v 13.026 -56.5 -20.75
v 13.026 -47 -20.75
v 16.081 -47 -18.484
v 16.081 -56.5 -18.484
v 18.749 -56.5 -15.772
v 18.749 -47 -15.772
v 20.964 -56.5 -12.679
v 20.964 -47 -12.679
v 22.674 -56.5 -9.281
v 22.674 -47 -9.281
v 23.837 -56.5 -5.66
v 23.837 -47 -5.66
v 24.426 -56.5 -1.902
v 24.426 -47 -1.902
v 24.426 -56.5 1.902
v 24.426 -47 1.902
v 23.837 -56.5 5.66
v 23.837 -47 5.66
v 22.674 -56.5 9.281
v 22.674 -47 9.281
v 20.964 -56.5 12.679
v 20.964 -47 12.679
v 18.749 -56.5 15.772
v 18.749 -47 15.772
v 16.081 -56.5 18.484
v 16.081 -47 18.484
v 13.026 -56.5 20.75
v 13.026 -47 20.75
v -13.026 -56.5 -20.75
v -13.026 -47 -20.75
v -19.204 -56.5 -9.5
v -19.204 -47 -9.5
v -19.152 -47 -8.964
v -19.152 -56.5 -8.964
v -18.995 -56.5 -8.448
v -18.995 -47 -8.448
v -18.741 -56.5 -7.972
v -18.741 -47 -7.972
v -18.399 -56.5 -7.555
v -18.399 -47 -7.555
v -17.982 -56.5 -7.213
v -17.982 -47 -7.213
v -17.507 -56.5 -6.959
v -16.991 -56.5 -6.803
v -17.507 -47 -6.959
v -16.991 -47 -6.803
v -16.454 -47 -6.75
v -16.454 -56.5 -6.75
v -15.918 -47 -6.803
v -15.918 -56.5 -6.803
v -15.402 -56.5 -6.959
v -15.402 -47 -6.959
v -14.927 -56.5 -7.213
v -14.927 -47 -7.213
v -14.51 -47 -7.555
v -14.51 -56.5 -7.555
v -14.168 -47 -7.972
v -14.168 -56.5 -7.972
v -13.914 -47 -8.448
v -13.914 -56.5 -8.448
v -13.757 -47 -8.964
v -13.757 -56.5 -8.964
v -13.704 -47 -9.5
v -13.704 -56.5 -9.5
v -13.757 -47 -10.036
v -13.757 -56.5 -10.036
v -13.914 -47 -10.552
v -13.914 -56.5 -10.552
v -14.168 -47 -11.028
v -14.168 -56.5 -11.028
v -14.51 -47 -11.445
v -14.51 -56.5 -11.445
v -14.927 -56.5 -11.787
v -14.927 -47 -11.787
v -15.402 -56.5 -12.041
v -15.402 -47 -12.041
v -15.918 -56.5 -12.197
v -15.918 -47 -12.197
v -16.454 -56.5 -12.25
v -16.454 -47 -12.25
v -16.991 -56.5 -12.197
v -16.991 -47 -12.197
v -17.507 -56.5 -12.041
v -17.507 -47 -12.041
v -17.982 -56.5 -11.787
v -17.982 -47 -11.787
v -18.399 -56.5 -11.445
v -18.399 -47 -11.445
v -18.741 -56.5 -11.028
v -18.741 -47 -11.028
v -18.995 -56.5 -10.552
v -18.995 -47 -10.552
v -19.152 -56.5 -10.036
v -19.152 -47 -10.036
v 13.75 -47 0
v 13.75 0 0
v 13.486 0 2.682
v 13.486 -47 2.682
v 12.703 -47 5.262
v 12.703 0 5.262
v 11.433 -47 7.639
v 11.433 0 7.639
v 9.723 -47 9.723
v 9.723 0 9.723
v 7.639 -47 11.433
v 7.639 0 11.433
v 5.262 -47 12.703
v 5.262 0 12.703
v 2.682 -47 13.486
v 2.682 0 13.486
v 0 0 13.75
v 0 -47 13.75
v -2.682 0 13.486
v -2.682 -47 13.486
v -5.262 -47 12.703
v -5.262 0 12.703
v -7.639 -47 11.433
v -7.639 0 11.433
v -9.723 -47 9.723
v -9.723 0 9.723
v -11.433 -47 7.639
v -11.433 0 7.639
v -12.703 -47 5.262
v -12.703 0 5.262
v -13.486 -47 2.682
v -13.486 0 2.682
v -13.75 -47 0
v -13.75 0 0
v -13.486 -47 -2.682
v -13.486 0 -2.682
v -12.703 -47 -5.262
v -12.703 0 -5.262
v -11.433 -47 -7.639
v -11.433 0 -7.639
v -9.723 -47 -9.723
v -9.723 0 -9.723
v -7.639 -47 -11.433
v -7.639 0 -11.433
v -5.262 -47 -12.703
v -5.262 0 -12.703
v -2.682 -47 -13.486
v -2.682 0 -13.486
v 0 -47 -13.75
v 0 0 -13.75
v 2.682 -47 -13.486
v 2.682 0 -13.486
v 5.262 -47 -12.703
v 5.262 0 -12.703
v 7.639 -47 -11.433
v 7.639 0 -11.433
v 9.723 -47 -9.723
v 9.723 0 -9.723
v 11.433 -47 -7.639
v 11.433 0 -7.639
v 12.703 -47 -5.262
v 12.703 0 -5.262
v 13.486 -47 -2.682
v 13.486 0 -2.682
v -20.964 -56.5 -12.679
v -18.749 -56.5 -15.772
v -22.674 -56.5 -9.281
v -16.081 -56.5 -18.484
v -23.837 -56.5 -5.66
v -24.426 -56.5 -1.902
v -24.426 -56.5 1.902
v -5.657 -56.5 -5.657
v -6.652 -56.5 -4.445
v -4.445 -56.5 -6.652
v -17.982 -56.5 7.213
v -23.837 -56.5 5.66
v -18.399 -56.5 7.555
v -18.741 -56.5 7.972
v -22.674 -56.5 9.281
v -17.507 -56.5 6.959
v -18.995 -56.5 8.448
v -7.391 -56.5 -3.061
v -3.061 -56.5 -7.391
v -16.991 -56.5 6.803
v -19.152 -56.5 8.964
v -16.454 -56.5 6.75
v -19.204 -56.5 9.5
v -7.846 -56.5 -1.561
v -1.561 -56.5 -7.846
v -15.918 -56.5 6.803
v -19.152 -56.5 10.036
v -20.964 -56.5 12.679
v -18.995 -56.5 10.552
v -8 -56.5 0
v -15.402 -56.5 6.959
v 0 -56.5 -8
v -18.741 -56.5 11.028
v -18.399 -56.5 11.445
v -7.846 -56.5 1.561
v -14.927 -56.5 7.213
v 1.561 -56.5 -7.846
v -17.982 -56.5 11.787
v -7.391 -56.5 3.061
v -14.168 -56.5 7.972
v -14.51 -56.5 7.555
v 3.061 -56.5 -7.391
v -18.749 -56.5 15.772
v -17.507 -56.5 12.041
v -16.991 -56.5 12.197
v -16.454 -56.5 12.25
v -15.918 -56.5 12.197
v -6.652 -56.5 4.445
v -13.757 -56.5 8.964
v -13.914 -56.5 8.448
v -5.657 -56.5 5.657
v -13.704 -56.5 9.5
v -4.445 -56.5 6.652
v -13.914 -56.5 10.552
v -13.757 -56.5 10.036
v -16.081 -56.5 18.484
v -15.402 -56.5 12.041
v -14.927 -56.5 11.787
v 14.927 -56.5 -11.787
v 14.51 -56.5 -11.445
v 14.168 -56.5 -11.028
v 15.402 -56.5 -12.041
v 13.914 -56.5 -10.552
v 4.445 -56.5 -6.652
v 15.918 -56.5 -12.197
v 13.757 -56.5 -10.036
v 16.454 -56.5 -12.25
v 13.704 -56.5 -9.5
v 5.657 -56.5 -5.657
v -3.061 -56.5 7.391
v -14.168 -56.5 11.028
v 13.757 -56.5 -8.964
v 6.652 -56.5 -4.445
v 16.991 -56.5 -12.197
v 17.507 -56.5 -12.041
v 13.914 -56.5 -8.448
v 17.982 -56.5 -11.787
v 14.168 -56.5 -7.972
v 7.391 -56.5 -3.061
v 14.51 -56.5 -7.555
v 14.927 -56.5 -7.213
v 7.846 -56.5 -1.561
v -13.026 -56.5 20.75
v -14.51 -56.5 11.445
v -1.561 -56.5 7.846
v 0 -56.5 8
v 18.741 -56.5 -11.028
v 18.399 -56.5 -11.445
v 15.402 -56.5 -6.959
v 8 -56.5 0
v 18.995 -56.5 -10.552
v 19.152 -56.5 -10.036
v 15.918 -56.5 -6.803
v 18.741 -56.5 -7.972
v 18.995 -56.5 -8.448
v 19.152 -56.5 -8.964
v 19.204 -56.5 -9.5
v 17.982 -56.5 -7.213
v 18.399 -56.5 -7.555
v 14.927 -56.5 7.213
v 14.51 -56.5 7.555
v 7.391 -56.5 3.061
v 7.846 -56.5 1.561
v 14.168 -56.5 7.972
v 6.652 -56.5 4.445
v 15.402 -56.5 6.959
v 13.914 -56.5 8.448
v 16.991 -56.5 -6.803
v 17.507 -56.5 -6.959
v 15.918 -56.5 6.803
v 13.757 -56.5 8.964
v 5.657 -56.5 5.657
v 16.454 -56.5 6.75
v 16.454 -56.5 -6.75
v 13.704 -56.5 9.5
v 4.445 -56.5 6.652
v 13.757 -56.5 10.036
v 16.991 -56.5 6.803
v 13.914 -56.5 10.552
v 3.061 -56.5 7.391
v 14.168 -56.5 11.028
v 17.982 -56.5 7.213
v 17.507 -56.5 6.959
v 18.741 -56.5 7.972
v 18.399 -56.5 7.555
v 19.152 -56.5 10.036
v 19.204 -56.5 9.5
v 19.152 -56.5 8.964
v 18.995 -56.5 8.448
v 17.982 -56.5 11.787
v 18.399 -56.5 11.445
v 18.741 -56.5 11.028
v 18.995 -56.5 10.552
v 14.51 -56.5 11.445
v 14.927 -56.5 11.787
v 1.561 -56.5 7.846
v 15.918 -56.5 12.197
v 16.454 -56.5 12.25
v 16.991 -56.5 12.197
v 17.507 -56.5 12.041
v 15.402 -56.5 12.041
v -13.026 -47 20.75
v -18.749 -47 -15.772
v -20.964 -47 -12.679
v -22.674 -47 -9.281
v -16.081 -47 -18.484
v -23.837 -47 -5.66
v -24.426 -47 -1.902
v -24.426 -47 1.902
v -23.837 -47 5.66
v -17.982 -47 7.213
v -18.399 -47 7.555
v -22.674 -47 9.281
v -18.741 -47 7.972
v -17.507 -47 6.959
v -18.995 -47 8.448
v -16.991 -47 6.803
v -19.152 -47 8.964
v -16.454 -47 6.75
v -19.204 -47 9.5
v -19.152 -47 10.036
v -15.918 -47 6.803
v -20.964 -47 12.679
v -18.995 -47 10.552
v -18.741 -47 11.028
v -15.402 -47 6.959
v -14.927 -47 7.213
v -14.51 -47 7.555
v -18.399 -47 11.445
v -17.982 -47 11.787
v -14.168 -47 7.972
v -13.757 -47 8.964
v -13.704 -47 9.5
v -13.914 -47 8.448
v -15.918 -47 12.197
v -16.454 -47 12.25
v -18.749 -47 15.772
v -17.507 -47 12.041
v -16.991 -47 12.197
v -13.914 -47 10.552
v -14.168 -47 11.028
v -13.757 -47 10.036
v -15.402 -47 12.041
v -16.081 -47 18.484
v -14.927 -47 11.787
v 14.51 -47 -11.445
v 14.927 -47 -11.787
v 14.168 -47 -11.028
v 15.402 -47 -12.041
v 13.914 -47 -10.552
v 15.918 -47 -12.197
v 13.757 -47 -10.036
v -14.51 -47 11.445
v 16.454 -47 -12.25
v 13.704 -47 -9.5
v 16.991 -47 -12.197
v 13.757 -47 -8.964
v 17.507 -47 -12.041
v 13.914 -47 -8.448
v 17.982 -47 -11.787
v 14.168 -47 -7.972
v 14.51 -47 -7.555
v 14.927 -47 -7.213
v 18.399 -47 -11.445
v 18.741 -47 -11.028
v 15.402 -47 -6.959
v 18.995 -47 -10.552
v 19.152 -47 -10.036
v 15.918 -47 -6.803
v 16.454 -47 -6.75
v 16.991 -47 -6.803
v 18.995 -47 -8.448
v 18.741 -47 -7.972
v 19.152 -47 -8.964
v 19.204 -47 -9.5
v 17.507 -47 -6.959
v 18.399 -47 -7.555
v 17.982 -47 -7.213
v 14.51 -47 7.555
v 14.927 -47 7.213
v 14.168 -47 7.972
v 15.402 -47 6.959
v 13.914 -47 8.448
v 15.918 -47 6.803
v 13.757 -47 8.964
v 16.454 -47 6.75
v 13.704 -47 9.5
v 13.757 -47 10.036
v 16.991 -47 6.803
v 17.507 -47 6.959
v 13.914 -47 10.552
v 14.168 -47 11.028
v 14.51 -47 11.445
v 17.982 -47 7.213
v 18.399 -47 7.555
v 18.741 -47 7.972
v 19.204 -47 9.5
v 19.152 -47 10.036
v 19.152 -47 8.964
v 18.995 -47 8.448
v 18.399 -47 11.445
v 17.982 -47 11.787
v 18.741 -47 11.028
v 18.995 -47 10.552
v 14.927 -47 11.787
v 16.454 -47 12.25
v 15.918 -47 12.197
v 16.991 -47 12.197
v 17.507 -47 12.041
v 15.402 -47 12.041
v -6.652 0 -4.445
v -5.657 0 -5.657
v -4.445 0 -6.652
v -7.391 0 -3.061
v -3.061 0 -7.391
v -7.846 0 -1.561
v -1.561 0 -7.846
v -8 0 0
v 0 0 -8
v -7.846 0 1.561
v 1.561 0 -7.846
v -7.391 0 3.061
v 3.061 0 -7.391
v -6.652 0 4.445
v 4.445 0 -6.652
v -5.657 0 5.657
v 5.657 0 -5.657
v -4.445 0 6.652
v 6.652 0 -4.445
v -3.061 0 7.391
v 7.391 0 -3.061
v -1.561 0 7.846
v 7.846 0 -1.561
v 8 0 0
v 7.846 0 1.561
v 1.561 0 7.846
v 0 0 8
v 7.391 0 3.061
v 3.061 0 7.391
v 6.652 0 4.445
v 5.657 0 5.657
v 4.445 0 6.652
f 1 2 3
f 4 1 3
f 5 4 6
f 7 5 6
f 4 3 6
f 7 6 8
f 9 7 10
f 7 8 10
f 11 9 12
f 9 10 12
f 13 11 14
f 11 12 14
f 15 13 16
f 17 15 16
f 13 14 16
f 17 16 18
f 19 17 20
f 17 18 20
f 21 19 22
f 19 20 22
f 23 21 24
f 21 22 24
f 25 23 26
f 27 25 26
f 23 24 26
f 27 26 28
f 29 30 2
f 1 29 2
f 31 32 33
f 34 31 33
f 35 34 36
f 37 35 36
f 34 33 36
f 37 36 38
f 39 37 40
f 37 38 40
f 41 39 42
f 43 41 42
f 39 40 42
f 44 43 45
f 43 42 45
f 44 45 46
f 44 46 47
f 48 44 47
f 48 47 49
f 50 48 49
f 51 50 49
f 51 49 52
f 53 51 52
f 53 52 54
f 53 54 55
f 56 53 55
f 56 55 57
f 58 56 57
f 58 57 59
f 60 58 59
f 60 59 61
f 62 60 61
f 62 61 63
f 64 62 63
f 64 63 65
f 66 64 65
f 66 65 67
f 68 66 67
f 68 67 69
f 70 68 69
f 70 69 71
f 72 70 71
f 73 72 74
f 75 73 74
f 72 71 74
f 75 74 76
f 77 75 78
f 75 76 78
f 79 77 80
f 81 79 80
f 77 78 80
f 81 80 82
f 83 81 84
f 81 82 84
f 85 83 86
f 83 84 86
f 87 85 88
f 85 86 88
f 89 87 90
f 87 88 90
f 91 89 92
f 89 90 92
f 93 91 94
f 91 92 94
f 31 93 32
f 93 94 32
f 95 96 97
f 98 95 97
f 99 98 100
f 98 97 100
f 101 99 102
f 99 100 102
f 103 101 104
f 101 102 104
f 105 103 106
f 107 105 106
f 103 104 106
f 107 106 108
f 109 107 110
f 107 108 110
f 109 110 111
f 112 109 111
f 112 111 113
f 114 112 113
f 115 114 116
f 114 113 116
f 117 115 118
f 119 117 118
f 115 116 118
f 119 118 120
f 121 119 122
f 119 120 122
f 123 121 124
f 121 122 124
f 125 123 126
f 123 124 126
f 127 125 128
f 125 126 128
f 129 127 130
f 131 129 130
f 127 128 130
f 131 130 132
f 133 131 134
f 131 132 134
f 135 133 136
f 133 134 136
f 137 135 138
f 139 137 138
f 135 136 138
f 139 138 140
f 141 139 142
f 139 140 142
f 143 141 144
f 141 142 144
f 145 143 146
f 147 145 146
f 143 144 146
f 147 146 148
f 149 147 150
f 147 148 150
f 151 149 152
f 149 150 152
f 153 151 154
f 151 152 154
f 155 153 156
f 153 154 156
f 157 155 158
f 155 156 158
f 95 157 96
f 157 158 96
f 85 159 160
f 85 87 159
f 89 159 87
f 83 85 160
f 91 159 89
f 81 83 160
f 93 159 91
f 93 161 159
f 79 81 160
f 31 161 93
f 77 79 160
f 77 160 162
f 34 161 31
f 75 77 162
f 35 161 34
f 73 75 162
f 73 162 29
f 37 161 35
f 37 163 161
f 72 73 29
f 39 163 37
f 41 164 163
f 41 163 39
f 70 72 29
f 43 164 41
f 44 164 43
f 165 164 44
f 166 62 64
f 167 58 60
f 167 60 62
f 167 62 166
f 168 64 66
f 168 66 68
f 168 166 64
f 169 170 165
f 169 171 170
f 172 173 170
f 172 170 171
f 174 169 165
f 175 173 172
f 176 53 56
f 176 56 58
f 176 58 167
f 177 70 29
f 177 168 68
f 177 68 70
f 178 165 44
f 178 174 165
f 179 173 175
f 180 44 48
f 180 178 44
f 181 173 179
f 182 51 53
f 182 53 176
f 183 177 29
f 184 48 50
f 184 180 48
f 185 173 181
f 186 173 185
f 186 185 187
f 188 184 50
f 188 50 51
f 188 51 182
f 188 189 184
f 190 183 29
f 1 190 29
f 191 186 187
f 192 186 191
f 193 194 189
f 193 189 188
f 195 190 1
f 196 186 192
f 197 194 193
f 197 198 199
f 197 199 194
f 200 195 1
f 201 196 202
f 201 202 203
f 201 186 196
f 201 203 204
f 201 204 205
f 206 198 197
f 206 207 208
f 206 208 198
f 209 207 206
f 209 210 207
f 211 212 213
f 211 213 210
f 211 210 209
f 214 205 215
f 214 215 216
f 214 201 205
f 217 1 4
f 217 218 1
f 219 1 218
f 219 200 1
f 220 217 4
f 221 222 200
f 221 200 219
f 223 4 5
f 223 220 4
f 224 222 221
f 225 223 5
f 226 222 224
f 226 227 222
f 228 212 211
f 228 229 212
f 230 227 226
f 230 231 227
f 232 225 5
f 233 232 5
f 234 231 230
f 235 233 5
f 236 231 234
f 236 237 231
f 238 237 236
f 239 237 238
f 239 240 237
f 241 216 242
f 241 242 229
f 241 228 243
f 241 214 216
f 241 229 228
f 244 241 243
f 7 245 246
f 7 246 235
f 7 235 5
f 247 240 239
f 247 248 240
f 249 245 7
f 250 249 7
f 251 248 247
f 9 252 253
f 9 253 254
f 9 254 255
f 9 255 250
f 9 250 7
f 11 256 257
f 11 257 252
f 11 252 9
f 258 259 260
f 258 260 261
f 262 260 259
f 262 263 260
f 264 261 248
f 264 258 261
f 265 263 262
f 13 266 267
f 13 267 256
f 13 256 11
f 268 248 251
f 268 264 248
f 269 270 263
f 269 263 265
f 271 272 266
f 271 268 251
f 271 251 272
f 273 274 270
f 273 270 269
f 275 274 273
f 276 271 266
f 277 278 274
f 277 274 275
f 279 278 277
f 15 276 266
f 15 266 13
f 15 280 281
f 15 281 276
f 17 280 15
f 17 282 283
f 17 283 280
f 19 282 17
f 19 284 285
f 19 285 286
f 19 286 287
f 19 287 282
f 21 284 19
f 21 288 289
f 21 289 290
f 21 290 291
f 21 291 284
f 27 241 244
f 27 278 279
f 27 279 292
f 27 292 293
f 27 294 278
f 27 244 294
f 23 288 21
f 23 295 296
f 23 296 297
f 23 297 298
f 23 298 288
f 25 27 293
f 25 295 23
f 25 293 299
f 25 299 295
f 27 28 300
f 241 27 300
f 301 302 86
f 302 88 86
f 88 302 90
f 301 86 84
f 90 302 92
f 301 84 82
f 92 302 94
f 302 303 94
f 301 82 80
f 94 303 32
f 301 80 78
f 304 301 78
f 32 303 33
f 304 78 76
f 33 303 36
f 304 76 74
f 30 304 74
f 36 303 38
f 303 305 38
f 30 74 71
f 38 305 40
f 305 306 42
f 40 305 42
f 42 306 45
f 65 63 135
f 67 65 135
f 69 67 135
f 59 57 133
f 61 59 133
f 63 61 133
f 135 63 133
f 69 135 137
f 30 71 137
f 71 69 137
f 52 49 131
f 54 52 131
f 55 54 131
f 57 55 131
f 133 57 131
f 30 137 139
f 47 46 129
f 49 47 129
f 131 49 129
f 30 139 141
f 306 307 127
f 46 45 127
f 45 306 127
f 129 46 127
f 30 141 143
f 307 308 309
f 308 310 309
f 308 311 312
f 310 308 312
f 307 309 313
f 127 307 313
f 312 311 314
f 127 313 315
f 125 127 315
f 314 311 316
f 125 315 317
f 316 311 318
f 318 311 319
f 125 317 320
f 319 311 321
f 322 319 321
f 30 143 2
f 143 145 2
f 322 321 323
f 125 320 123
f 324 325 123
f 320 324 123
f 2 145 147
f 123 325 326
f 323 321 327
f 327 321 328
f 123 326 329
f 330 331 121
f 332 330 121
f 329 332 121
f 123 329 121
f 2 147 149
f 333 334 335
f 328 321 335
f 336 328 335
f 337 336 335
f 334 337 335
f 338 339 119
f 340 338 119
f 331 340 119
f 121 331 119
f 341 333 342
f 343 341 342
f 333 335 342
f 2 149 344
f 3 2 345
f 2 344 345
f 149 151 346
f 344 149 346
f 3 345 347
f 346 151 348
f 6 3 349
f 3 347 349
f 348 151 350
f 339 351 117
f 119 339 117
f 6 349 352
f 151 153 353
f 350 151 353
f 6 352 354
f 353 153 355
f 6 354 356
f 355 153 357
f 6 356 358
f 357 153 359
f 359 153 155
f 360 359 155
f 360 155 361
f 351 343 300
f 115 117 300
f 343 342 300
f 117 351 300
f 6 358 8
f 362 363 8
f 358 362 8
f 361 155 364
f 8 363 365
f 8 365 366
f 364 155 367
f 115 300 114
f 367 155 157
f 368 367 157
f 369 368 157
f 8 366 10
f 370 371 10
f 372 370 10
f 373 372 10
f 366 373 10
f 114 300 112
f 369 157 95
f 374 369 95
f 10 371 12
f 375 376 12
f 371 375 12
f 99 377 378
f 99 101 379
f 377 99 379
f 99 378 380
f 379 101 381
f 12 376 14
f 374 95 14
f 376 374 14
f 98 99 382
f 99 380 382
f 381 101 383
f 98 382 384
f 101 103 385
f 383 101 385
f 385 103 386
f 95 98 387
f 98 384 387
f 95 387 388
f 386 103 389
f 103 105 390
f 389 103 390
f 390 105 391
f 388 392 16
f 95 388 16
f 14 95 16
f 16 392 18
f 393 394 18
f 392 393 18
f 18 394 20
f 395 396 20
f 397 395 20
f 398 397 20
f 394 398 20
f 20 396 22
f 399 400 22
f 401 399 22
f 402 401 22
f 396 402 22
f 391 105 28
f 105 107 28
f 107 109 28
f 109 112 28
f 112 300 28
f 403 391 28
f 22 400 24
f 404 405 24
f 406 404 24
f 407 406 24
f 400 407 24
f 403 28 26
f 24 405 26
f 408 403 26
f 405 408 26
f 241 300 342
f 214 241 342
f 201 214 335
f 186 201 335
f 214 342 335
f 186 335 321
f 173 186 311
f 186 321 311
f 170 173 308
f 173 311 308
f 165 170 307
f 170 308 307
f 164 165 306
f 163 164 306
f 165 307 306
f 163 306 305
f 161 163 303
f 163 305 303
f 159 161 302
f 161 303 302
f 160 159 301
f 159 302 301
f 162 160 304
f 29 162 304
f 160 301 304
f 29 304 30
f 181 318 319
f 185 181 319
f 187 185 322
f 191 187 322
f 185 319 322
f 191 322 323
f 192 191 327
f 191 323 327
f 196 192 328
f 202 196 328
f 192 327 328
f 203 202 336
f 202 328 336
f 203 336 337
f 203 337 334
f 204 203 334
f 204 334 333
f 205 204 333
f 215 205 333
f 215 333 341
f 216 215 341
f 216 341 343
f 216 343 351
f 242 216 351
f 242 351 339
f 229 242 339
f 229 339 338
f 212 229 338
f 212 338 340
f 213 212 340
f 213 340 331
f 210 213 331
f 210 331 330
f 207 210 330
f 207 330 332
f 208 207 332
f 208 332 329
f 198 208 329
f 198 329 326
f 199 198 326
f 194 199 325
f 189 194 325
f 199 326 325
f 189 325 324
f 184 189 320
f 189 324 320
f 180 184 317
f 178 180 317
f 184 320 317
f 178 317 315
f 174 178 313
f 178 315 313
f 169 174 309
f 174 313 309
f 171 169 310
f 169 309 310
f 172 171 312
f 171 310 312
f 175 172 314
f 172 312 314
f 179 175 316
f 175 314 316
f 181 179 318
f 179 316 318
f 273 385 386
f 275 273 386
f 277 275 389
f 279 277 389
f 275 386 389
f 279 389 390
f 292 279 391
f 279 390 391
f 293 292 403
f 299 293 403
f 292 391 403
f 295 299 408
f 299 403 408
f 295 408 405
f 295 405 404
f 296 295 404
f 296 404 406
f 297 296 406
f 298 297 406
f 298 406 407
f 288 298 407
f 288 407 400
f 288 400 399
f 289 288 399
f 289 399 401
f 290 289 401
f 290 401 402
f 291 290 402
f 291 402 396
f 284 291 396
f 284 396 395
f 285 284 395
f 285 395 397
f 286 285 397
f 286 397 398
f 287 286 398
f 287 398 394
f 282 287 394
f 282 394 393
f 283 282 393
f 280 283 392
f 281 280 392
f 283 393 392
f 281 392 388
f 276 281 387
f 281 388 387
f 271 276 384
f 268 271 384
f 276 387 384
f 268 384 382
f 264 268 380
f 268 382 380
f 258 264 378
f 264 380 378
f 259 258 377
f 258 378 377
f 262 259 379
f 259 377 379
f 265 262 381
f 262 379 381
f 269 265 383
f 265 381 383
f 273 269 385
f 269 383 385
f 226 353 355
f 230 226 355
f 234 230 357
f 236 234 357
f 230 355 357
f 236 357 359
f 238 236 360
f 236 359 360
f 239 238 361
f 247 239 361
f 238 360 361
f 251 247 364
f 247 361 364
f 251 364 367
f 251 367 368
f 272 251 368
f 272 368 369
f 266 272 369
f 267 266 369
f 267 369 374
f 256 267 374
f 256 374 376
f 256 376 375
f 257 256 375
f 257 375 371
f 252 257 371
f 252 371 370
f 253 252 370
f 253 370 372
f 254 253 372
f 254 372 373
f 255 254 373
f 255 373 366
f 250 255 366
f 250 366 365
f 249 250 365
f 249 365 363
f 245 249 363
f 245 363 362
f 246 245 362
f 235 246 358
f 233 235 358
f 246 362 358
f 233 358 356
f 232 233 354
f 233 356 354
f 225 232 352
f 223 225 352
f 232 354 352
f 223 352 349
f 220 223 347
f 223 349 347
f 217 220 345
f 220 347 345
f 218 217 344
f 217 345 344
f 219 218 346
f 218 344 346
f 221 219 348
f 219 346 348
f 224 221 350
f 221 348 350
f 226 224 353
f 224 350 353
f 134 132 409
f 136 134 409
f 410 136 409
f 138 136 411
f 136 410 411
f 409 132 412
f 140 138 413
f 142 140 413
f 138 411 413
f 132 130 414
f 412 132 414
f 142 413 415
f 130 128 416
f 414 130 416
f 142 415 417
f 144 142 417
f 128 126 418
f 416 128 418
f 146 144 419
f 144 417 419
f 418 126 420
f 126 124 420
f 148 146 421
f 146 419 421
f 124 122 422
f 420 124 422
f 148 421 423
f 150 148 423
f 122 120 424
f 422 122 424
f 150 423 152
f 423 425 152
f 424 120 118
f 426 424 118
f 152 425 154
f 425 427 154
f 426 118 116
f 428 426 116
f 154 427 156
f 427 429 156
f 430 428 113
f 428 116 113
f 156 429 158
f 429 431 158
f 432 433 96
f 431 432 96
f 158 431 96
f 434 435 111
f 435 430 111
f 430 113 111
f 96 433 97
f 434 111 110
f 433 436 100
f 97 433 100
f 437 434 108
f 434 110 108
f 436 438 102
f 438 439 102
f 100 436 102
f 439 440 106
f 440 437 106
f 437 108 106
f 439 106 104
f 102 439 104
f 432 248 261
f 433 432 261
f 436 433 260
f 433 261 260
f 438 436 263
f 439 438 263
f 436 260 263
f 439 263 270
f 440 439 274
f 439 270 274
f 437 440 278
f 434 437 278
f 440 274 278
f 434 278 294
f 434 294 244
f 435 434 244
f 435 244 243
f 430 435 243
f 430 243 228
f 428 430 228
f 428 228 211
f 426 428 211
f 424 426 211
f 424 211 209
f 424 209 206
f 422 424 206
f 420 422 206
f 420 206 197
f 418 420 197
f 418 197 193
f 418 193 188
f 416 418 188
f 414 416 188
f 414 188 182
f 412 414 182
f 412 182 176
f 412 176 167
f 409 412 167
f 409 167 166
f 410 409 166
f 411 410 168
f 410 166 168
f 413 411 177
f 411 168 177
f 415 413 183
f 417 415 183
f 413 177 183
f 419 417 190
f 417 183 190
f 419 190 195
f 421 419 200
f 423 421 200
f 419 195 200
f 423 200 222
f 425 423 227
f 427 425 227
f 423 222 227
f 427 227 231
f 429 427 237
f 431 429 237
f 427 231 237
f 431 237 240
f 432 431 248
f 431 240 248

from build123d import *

# Parameters (mm, degrees)
F0_R     = 13.75
F1_DEPTH = 47
F2_R     = 13.75
F3_DEPTH = 9.5
F4_R     = 8
F5_DEPTH = 56.501
F7_D     = 5.5


with BuildPart() as f1:
    # F0 (on Front) → F1 (new body)
    with BuildSketch(Plane.XZ):
        Circle(F0_R)
    extrude(amount=F1_DEPTH)

    # F2 (on face) → F3 (join)
    with BuildSketch(Plane.XZ.offset(47)):
        with BuildLine():
            Line((13.0264154701, 20.75), (-13.0264154701, 20.75))
            ThreePointArc((-13.0264154701, 20.75), (-24.5, 0), (-13.0264154701, -20.75))
            Line((-13.0264154701, -20.75), (13.0264154701, -20.75))
            ThreePointArc((13.0264154701, -20.75), (24.5, 0), (13.0264154701, 20.75))
        make_face()
        Circle(F2_R, mode=Mode.SUBTRACT)
        Circle(F2_R)
    extrude(amount=F3_DEPTH)

    # F4 (on face) → F5 (cut, through all)
    with BuildSketch(Plane.XZ.offset(56.5)):
        Circle(F4_R)
    extrude(amount=-F5_DEPTH, mode=Mode.SUBTRACT)

    # F7 (through all)
    with Locations(Plane.XZ.offset(56.5)):
        with Locations((-16.4544826719, 9.5), (-16.4544826719, -9.5), (16.4544826719, 9.5), (16.4544826719, -9.5)):
            Hole(F7_D / 2)


solid = f1.part
